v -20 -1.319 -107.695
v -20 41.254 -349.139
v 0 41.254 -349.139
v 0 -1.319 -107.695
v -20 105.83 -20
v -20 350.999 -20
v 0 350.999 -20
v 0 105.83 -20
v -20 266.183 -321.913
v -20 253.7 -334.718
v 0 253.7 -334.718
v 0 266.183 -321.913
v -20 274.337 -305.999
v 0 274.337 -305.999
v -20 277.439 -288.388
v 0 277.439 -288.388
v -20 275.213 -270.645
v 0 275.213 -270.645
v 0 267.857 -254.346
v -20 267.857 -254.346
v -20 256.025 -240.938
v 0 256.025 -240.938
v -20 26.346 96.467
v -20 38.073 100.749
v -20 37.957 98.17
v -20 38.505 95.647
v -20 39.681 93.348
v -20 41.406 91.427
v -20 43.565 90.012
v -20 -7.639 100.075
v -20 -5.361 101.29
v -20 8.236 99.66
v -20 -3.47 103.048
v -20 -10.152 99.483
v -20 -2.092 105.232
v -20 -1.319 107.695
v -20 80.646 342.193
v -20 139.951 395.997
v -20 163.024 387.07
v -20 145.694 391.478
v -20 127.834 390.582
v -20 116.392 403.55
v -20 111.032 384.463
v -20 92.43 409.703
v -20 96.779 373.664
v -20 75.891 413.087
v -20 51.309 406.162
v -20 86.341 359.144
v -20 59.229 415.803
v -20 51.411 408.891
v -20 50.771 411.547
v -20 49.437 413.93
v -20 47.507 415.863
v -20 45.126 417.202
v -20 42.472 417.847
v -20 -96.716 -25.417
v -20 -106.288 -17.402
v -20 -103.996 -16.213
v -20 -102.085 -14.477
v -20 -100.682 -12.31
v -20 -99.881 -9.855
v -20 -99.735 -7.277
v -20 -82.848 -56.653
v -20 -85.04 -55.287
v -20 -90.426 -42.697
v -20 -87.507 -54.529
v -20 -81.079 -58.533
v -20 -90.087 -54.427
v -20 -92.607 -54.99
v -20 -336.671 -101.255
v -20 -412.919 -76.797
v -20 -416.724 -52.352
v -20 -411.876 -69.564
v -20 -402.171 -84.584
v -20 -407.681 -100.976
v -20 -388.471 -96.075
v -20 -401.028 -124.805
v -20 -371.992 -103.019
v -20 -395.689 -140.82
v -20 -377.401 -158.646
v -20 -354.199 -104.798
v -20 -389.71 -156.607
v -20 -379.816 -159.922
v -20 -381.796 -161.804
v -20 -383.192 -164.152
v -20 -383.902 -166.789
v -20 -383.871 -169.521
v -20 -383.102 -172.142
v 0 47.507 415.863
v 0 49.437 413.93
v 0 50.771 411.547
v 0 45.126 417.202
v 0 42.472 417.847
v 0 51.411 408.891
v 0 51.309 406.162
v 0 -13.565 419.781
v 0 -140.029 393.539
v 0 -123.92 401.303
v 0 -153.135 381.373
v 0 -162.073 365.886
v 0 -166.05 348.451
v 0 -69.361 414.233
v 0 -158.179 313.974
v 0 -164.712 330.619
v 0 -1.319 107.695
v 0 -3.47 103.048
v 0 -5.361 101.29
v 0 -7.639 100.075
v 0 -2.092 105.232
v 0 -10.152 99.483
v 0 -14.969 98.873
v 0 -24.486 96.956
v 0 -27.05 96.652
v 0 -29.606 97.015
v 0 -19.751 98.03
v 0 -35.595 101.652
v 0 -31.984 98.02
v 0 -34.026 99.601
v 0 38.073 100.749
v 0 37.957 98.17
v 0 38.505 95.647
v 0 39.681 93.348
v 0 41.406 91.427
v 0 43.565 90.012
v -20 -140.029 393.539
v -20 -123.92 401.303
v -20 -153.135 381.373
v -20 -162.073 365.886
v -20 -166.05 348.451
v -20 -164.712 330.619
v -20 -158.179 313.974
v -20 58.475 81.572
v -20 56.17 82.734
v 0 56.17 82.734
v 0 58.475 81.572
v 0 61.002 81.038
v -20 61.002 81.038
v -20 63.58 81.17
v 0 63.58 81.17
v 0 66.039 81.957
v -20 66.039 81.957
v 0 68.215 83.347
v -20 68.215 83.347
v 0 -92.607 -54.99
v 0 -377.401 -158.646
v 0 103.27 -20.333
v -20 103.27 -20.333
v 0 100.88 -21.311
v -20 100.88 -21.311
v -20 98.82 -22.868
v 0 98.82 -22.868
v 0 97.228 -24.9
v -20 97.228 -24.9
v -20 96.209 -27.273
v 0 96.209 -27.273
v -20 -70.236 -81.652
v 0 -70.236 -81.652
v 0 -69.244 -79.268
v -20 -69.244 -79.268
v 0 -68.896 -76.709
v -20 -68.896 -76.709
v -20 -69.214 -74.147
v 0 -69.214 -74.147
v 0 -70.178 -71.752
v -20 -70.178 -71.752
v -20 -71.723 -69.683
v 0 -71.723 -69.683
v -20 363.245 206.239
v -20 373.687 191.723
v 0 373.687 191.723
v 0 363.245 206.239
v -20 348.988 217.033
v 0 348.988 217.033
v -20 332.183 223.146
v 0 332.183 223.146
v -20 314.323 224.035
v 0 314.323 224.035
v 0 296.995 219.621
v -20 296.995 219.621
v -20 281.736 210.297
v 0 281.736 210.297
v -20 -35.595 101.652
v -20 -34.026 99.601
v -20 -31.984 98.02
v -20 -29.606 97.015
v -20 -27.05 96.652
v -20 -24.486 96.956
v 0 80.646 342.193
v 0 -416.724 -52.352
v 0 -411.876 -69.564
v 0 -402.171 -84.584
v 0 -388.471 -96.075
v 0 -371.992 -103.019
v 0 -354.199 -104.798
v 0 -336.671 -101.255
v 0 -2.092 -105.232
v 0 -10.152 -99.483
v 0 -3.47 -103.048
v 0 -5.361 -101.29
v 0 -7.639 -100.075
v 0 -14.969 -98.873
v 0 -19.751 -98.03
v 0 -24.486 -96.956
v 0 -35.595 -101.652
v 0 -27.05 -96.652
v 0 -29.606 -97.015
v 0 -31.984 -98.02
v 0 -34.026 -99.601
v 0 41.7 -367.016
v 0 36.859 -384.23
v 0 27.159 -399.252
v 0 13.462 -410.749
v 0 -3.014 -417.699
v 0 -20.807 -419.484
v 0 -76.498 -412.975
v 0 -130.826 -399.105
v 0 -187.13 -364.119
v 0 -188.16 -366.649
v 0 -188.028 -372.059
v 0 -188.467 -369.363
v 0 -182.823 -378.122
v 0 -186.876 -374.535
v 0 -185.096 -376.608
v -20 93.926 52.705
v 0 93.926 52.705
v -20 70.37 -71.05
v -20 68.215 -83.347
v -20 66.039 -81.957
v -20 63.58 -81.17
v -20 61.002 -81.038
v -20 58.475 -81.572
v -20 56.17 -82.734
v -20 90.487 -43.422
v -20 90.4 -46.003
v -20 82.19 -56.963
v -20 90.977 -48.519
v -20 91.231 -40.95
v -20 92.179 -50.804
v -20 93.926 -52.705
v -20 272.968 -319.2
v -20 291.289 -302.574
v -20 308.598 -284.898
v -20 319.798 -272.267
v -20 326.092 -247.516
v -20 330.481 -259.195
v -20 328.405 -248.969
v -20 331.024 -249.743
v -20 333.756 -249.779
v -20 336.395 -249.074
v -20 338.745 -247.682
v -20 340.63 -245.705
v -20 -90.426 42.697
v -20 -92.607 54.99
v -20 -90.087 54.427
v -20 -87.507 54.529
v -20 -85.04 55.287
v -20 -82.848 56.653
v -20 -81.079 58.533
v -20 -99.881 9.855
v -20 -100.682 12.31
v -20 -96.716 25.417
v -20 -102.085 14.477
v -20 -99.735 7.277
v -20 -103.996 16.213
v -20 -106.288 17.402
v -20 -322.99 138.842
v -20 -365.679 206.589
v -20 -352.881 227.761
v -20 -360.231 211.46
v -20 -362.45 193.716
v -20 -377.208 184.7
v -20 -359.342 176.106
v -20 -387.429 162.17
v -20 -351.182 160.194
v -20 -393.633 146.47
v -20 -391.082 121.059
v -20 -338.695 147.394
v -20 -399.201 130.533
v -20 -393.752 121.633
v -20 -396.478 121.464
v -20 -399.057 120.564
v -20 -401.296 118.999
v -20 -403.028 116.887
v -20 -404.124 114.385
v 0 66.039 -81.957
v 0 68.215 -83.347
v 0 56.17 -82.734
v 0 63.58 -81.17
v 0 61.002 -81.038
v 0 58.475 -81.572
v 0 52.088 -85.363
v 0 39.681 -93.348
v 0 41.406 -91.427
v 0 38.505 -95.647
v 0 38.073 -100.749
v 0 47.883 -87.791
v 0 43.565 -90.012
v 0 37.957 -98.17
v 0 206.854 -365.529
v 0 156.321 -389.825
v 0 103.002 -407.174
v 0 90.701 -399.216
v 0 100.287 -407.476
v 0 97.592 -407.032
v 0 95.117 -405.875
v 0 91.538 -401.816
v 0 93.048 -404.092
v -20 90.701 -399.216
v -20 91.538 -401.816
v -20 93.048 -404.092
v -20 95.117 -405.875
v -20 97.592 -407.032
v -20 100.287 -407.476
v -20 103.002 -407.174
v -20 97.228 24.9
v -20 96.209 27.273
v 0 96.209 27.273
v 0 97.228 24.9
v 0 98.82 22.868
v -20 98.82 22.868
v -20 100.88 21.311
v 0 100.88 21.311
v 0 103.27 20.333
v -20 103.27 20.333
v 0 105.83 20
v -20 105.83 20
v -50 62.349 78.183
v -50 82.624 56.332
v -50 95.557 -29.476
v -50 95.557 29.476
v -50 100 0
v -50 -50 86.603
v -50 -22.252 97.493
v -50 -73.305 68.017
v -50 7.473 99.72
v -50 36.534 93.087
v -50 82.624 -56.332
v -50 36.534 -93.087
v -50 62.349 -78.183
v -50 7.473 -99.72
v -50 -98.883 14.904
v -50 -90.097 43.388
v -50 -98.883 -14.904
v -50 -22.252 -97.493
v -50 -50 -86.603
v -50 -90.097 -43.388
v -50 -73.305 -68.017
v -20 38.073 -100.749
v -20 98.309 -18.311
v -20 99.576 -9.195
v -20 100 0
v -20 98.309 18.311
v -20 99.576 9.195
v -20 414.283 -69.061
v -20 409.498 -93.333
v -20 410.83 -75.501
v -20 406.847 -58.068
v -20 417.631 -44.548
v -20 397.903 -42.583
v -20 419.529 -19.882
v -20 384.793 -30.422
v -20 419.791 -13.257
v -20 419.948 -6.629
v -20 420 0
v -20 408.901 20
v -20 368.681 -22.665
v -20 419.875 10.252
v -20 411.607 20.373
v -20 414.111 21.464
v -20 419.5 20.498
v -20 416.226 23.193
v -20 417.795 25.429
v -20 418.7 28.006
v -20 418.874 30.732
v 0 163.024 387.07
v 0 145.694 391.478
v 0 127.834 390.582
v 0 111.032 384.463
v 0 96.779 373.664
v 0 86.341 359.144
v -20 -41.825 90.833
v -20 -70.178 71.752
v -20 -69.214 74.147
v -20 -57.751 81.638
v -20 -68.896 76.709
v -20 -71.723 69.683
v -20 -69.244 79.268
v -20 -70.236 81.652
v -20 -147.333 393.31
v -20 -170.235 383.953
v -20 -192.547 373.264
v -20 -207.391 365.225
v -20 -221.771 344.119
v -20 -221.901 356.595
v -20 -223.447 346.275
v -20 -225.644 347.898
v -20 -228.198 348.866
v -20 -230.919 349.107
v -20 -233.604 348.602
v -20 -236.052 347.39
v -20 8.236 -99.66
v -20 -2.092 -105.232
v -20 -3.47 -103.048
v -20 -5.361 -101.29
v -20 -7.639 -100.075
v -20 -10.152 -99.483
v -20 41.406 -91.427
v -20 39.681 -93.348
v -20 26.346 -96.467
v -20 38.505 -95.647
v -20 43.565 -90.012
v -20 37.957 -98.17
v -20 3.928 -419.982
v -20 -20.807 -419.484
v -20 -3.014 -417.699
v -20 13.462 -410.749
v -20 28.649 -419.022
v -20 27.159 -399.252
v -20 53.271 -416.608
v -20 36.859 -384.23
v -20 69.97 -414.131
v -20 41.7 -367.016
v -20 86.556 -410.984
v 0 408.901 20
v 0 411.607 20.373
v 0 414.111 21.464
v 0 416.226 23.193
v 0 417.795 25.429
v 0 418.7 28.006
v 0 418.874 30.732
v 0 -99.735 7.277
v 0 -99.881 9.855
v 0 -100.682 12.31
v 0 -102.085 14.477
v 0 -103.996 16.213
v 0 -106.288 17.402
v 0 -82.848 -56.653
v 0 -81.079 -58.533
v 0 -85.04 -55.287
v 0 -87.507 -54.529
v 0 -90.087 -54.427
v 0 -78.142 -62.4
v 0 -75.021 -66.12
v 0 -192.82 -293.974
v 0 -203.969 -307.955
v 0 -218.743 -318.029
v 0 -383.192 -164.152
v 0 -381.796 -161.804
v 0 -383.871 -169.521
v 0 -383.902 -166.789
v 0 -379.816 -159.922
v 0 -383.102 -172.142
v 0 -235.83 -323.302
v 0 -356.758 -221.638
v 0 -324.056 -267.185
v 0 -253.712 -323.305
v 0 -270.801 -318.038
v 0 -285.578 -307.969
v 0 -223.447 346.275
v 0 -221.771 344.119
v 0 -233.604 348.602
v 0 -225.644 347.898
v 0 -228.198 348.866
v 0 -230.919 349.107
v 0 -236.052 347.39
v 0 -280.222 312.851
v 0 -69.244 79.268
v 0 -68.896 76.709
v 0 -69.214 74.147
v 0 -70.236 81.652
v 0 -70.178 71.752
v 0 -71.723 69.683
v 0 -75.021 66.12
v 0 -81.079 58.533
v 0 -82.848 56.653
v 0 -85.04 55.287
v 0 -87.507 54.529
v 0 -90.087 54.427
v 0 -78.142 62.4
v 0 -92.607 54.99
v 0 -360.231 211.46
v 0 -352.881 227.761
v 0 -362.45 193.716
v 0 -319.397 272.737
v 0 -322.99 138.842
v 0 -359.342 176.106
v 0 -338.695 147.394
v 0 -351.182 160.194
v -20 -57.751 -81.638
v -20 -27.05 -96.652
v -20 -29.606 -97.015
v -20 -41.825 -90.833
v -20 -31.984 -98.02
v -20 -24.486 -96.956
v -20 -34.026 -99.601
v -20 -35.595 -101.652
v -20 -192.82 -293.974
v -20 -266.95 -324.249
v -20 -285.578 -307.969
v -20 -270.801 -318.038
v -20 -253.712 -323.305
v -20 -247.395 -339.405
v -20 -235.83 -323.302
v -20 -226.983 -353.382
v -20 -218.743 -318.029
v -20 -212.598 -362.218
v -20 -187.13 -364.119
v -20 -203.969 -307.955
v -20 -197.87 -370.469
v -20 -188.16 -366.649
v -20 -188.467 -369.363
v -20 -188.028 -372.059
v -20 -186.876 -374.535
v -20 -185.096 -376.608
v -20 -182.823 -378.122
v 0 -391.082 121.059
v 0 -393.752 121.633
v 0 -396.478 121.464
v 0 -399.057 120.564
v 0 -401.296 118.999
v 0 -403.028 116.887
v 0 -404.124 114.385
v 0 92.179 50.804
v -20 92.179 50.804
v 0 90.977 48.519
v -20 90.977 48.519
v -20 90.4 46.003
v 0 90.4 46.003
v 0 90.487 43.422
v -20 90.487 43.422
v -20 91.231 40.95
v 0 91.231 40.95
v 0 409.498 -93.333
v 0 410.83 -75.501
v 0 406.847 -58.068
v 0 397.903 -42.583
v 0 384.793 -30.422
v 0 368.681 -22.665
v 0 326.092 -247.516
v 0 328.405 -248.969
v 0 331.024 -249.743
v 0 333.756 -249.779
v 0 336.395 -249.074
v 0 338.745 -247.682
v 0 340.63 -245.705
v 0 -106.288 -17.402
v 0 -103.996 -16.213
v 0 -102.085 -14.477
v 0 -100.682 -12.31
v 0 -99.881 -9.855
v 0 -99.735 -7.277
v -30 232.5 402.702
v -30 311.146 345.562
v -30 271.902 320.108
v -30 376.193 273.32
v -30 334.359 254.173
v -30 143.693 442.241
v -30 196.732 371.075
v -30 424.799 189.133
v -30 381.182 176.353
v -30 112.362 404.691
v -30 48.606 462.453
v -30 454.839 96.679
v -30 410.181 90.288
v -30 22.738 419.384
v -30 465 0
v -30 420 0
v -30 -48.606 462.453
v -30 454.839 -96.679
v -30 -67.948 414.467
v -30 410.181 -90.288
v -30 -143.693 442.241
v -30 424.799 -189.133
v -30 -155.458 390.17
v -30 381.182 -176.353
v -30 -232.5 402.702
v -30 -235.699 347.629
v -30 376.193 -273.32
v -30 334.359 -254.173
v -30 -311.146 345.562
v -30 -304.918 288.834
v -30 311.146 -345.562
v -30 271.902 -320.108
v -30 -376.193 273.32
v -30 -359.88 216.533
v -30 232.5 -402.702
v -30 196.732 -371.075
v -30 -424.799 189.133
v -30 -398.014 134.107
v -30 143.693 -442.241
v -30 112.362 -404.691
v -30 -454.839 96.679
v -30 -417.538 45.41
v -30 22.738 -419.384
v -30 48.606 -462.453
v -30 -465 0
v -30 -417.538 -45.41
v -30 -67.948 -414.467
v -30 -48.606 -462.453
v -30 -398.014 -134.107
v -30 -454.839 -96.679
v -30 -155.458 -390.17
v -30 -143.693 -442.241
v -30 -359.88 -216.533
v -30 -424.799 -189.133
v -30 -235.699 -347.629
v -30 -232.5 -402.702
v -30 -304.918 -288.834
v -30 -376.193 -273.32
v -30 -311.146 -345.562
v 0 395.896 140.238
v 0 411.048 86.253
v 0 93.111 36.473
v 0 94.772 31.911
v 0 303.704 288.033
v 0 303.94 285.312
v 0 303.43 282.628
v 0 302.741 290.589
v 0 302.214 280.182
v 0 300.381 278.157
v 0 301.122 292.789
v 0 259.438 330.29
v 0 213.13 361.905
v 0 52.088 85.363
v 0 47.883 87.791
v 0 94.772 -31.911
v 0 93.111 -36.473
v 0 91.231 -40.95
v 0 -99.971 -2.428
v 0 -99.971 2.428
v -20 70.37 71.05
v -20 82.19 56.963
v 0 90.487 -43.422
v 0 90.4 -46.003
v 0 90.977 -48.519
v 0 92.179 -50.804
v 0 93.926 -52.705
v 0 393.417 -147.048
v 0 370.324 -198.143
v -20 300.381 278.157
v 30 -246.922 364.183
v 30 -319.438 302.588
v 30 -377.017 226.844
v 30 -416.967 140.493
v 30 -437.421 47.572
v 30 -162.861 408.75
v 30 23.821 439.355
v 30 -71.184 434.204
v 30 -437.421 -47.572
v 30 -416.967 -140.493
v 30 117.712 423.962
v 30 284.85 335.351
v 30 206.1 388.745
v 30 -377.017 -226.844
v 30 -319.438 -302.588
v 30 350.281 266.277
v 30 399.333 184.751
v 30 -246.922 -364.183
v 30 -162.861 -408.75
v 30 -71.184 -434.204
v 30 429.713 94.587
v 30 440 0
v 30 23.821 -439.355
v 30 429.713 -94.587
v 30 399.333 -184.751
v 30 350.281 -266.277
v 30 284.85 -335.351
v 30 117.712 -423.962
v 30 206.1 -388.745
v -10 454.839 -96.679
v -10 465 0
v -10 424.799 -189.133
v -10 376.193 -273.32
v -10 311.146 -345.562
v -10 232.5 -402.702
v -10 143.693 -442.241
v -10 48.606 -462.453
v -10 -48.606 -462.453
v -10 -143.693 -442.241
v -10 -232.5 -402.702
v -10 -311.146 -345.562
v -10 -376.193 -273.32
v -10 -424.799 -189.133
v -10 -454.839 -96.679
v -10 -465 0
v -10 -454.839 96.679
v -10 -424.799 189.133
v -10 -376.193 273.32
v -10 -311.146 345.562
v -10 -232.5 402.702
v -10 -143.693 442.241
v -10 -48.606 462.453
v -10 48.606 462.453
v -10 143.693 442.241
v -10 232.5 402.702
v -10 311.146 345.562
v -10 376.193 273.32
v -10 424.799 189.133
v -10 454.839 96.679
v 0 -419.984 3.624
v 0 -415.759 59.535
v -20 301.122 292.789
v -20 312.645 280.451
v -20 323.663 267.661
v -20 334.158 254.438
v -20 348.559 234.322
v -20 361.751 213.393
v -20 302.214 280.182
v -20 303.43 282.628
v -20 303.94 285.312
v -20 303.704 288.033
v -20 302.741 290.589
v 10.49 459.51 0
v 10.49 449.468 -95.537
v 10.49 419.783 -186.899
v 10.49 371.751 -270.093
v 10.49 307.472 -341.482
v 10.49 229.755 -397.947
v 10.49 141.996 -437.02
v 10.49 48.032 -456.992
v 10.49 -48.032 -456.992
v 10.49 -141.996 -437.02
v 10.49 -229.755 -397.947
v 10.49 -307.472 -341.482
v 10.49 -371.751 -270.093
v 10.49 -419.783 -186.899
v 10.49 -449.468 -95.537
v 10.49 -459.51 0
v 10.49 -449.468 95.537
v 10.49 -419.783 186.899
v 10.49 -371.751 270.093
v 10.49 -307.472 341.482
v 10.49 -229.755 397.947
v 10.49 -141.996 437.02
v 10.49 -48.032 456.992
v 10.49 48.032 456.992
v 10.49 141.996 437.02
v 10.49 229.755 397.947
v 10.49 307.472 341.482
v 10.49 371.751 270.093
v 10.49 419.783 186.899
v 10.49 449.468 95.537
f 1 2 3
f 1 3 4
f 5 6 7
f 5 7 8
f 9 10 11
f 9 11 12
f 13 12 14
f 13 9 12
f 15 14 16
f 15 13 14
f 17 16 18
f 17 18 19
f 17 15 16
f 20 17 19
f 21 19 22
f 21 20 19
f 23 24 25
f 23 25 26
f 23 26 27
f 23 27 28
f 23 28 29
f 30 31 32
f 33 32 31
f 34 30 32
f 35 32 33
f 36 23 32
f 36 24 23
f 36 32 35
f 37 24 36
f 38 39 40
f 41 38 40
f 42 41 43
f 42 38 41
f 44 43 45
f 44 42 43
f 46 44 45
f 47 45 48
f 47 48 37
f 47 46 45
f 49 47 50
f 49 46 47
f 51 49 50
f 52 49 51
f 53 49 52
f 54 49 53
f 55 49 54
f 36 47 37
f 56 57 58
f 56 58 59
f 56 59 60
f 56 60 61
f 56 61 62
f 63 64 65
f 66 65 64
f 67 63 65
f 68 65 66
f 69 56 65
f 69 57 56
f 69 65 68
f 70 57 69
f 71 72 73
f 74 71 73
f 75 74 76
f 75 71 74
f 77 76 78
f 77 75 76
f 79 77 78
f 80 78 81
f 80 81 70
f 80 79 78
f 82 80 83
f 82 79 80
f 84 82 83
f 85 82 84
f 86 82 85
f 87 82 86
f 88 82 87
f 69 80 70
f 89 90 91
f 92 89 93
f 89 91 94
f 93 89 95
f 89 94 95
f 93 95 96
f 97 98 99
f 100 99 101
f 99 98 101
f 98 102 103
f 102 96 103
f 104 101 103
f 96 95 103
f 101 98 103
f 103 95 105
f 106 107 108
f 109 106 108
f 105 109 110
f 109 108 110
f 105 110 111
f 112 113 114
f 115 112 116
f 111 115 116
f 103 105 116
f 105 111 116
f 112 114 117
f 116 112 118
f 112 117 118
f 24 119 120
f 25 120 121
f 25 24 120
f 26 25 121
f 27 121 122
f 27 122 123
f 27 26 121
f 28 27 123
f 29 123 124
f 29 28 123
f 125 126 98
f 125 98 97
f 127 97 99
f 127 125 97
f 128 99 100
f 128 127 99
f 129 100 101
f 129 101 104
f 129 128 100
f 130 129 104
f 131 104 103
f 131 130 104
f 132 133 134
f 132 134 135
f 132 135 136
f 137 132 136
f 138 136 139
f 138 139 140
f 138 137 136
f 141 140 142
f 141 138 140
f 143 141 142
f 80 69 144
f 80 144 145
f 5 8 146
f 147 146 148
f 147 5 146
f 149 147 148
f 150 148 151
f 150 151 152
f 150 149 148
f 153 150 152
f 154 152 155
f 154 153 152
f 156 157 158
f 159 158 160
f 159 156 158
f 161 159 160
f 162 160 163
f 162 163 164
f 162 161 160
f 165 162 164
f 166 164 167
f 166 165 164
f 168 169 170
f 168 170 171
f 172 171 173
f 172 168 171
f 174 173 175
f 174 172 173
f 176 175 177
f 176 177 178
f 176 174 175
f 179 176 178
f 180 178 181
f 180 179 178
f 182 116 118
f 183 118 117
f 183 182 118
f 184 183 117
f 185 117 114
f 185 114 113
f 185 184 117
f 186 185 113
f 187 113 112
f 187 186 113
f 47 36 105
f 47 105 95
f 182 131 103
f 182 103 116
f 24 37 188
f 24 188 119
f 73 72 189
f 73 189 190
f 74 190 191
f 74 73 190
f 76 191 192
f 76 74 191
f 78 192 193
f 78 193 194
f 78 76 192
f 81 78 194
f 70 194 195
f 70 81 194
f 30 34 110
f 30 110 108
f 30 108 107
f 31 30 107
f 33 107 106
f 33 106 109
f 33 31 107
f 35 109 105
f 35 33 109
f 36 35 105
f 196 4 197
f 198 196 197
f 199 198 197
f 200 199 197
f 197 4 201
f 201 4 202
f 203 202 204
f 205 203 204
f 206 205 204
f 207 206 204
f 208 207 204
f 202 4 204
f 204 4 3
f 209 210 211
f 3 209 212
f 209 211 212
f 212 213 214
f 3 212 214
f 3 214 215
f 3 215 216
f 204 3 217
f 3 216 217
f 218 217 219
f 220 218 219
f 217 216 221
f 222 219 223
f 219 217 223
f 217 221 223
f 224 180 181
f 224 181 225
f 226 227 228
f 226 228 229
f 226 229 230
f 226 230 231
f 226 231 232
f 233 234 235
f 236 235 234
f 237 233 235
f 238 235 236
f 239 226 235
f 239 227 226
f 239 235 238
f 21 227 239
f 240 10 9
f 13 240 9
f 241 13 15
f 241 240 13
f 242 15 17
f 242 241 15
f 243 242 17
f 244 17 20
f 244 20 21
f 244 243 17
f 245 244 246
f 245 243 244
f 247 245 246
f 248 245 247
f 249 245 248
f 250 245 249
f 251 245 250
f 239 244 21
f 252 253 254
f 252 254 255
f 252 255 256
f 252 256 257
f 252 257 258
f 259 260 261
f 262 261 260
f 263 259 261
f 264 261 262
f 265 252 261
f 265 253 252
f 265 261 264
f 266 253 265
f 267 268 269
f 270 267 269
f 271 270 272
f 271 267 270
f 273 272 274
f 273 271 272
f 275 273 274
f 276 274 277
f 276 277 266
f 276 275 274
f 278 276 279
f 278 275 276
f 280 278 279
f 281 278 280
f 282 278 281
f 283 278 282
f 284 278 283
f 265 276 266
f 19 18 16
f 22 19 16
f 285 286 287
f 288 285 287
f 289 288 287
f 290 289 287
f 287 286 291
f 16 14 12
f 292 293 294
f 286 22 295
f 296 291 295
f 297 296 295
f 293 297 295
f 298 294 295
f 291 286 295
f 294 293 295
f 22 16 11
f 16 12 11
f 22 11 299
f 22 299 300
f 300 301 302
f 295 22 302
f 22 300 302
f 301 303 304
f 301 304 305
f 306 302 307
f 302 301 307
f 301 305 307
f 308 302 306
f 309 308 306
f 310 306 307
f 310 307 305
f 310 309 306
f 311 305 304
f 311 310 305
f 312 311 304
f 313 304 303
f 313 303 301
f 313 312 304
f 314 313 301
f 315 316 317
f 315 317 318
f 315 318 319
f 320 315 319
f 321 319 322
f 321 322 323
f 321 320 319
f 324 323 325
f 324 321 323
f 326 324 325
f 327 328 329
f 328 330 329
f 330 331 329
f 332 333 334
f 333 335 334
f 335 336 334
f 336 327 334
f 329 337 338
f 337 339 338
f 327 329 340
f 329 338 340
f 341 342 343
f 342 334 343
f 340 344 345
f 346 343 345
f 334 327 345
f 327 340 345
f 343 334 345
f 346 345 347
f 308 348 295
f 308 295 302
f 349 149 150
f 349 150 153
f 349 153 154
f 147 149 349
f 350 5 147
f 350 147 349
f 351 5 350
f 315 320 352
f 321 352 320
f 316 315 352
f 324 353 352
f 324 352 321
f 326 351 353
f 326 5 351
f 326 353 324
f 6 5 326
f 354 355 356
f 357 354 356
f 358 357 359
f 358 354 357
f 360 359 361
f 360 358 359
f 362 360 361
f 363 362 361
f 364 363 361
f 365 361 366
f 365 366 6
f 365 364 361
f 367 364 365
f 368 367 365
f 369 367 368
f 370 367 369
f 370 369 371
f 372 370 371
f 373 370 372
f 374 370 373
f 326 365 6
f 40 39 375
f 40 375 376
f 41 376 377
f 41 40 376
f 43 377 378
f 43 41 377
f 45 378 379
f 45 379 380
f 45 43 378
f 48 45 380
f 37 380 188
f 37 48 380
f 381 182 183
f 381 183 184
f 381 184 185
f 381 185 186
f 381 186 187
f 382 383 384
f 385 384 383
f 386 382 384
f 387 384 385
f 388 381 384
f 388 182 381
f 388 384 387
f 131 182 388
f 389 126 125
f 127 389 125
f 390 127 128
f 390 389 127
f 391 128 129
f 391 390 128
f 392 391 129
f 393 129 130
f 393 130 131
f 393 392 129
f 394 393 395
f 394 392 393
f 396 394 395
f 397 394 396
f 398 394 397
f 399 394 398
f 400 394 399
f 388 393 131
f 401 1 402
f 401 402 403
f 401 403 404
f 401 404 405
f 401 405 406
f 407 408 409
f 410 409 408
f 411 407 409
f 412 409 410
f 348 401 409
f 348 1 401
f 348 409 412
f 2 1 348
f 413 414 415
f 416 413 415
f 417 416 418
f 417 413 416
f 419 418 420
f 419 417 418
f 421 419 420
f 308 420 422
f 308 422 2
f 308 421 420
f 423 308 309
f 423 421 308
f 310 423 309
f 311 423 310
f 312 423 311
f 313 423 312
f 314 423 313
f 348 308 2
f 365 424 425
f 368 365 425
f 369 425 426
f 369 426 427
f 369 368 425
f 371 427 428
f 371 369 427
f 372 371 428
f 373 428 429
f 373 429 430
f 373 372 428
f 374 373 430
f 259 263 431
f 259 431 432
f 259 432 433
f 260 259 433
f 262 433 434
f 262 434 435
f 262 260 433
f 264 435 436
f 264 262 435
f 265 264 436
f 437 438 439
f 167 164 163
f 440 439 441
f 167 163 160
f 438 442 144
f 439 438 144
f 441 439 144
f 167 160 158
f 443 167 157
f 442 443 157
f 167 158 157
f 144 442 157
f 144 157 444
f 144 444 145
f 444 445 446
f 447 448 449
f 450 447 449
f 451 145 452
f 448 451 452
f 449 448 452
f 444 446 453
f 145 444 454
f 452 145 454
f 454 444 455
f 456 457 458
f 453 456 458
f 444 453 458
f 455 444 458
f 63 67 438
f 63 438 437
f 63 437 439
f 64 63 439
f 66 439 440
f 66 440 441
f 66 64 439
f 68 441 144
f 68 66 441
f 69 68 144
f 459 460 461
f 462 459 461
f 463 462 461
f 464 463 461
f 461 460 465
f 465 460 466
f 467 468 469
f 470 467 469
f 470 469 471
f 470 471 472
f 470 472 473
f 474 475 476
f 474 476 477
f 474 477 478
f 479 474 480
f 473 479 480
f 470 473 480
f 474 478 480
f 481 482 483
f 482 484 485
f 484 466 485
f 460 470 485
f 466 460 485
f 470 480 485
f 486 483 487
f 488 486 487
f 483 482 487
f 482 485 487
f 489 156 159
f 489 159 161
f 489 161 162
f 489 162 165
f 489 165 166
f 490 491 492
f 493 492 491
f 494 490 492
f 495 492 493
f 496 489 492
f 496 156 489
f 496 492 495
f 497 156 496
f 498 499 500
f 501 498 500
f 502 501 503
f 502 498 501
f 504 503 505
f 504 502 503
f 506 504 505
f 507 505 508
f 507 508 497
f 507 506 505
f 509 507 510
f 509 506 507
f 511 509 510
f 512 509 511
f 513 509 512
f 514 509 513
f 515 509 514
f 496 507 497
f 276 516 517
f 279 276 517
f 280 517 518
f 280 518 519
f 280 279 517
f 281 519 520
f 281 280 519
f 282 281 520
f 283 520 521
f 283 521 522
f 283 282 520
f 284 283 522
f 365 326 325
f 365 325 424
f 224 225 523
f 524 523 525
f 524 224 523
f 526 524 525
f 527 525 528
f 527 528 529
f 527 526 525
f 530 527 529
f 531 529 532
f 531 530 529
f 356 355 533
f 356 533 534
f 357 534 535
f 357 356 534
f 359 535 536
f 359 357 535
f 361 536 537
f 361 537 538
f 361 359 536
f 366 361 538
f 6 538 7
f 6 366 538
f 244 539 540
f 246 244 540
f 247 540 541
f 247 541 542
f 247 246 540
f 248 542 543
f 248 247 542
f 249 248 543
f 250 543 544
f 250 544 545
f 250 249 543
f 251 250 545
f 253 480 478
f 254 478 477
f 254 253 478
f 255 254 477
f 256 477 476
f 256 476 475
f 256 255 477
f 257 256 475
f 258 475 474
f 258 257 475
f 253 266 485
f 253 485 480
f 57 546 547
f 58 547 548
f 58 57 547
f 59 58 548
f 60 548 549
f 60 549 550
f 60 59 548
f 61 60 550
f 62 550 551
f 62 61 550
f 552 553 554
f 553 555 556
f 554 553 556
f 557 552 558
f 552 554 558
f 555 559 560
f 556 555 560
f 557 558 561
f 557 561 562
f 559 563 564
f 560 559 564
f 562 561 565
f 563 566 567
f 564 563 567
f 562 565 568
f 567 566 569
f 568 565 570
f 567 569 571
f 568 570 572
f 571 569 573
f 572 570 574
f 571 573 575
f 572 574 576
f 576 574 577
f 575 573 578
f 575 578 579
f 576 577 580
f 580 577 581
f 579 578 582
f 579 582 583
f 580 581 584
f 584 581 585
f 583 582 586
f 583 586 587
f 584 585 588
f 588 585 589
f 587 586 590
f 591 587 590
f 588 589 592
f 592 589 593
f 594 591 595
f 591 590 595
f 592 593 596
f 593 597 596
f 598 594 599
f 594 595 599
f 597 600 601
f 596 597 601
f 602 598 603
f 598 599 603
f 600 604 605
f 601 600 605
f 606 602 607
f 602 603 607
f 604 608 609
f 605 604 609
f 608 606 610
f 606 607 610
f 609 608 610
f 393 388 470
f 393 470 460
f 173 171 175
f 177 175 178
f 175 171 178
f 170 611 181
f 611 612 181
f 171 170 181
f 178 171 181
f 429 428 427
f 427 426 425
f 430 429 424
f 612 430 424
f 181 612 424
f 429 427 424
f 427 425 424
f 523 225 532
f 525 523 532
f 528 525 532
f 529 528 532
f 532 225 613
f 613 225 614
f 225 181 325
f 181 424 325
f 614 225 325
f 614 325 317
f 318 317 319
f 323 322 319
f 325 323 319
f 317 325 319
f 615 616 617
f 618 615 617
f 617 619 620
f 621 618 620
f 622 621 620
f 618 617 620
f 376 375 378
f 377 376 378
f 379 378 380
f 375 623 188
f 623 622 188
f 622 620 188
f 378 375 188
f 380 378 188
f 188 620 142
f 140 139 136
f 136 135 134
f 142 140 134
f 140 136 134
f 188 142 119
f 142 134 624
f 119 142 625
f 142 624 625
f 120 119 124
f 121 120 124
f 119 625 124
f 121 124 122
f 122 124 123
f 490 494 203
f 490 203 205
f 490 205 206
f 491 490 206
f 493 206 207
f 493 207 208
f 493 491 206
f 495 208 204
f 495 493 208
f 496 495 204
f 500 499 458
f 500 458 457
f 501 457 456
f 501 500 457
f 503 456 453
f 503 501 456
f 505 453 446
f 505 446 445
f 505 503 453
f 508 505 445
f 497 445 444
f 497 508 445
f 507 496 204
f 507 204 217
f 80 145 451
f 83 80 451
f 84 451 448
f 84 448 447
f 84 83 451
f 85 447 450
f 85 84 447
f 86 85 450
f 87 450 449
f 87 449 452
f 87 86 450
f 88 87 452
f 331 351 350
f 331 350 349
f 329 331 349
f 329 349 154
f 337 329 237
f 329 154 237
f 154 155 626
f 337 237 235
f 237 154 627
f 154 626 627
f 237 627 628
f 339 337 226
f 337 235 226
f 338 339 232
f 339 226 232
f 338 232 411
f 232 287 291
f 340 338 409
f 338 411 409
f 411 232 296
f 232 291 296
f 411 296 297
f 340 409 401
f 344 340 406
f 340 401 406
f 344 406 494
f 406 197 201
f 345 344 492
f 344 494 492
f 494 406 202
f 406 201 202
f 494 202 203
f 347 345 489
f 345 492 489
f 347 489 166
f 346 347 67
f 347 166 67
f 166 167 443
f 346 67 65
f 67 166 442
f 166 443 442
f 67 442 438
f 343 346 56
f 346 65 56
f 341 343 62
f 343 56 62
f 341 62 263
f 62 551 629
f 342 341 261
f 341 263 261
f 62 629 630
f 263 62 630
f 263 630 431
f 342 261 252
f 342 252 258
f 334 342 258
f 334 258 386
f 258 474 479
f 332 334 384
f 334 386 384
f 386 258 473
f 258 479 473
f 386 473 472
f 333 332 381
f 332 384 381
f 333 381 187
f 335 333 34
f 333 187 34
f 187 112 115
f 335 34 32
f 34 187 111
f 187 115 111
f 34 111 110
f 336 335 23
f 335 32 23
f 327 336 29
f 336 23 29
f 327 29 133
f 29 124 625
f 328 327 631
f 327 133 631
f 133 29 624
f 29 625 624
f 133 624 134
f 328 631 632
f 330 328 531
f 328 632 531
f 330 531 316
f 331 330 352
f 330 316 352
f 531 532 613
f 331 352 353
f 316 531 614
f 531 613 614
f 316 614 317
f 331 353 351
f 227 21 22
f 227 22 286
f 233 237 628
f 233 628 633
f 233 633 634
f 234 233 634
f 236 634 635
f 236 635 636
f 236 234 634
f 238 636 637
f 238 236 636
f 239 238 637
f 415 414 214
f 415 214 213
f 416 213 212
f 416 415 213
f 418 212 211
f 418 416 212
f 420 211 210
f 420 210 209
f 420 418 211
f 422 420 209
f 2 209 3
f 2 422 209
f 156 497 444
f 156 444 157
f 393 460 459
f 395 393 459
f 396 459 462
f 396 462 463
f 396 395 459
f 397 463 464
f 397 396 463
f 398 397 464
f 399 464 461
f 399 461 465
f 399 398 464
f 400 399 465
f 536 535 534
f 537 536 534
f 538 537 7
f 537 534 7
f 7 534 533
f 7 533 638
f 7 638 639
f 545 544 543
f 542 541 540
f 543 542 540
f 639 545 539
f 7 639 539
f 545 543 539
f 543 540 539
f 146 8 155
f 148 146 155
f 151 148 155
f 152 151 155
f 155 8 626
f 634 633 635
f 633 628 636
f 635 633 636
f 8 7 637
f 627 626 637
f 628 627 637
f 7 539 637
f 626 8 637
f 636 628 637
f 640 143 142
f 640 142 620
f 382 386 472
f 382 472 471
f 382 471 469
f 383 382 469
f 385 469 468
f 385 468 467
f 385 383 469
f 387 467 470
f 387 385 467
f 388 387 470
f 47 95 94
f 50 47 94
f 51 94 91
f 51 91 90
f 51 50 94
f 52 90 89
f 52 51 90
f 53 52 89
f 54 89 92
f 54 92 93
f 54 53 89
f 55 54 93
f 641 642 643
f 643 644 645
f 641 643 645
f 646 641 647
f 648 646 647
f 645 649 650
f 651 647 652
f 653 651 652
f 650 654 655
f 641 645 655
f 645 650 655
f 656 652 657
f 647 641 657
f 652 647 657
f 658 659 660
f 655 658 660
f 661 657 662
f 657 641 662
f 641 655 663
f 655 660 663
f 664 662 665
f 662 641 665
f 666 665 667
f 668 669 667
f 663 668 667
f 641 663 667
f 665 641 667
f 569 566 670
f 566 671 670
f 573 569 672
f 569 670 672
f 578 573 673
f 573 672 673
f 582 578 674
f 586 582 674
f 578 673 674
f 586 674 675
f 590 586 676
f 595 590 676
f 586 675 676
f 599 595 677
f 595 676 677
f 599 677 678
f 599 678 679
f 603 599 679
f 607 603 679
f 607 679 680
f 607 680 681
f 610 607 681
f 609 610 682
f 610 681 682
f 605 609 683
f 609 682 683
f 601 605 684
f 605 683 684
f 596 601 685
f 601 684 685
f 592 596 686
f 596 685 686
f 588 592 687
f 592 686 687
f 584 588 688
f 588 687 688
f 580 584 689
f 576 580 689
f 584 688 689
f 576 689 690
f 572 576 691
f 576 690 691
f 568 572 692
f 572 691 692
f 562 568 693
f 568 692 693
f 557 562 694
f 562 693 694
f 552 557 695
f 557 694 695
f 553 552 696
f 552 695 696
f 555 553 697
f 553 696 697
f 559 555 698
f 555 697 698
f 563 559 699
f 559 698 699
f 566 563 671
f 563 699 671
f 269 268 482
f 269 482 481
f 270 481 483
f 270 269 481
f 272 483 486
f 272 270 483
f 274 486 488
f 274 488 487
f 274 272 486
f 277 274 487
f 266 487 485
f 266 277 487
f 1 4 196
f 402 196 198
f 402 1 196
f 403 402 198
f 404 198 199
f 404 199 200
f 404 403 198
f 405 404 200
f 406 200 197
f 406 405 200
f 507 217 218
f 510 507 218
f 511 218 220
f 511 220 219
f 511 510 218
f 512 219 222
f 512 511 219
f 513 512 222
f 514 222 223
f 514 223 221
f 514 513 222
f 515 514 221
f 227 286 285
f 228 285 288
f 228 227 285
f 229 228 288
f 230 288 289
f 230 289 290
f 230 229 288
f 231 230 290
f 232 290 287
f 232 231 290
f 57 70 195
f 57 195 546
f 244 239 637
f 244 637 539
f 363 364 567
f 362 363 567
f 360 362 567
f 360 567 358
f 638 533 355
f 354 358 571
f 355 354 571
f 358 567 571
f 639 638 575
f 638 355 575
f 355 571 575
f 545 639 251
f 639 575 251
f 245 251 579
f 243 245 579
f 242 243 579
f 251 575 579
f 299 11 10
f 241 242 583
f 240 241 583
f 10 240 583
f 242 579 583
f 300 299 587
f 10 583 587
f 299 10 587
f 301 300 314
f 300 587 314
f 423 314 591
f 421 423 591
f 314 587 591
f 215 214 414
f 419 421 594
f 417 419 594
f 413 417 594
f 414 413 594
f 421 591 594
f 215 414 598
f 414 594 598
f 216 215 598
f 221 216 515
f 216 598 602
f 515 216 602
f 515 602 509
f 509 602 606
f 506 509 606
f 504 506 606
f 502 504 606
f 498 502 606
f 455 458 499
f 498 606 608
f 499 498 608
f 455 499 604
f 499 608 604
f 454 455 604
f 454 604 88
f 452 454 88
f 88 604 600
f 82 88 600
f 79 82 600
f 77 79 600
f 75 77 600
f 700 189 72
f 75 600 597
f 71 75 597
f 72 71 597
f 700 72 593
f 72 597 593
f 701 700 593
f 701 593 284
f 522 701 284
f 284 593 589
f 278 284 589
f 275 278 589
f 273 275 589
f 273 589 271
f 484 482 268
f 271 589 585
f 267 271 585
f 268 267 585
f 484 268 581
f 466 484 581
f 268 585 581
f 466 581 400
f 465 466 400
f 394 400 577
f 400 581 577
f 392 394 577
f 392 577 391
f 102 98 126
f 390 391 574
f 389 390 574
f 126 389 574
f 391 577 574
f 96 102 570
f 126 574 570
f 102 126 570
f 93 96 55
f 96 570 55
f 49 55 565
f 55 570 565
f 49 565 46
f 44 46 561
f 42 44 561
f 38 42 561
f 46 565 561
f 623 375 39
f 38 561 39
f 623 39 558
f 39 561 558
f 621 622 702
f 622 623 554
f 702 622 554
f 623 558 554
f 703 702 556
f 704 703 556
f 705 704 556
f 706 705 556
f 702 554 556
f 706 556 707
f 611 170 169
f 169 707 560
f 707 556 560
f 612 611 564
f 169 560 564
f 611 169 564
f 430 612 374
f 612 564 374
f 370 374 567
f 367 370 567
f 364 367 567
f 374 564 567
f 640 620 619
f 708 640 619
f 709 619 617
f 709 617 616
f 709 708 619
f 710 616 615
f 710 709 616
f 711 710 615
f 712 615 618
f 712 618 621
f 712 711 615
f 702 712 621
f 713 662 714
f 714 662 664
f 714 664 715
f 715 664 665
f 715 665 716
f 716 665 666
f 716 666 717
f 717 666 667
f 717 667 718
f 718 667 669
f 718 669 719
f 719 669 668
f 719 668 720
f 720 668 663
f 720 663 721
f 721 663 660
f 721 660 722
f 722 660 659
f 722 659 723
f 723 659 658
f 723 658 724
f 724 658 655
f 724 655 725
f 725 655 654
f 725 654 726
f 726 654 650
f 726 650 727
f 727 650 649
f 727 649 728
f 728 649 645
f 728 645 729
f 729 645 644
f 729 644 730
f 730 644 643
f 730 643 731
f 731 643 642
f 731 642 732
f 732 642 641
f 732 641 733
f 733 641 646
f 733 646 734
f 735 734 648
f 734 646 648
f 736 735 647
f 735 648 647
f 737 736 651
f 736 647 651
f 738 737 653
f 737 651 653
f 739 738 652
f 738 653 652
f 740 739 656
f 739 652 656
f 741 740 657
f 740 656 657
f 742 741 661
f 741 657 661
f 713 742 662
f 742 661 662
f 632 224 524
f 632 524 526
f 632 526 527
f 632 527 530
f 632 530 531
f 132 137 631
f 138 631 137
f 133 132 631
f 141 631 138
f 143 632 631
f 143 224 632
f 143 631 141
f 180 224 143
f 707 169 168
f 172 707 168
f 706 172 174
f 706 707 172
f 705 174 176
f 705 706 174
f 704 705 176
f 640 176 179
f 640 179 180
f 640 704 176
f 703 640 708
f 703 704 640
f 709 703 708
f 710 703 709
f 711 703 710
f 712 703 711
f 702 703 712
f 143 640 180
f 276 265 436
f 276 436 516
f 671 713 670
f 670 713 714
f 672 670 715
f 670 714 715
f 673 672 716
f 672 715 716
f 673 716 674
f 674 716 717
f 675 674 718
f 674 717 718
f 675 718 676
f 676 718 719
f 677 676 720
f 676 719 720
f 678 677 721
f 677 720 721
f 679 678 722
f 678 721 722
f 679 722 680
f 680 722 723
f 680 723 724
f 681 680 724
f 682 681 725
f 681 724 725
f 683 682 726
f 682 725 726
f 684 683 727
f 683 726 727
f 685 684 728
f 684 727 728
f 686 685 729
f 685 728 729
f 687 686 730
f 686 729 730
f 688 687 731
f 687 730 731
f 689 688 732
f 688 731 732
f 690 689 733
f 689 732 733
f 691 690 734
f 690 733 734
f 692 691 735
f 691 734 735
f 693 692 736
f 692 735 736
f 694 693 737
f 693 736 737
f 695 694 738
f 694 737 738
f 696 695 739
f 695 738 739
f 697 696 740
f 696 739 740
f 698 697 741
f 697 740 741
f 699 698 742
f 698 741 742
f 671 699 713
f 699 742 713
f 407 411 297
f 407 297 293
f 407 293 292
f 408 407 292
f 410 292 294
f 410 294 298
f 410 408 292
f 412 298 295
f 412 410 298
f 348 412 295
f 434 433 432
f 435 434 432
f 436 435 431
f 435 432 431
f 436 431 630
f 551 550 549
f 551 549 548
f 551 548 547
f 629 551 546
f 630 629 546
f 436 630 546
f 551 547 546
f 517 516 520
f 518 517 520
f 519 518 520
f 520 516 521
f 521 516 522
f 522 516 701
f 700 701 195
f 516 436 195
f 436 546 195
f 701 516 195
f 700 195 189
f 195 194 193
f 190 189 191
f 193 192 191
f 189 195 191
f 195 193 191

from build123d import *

# Parameters (mm, degrees)
BOSS_EXTRUDE1_START = 20
BOSS_EXTRUDE1_DEPTH = 20
CIRPATTERN1_COUNT   = 9


with BuildPart() as part:
    # Sketch1 → Revolve1 (revolve)
    with BuildSketch(Plane.XY):
        Polygon((-50, 0), (-50, 100), (0, 100), (0, 420), (-30, 420), (-30, 465), (-10, 465), (10.490381057, 459.509618943), (30, 440), (30, 0), align=None)
    revolve(axis=Axis((30, 0, 0), (-1, 0, 0)))

    # Sketch2 → Boss-Extrude1 (add)
    with BuildSketch(Plane.ZY.offset(BOSS_EXTRUDE1_START)):
        with BuildLine():
            ThreePointArc((27.272727273, 96.209138584), (22.022759648, 99.799825551), (20, 105.830052443))
            Line((20, 105.830052443), (20, 408.900966005))
            ThreePointArc((20, 408.900966005), (23.192543543, 416.226164746), (30.731707317, 418.874160298))
            ThreePointArc((30.731707317, 418.874160298), (5.43490171, 419.964834056), (-19.881656805, 419.529164329))
            ThreePointArc((-19.881656805, 419.529164329), (-56.82924306, 416.1375219), (-93.333333333, 409.498338078))
            ThreePointArc((-93.333333333, 409.498338078), (-42.583426132, 397.902733094), (-20, 350.998575496))
            Line((-20, 350.998575496), (-20, 105.830052443))
            ThreePointArc((-20, 105.830052443), (-22.022759648, 99.799825551), (-27.272727273, 96.209138584))
            ThreePointArc((-27.272727273, 96.209138584), (0, 100), (27.272727273, 96.209138584))
        make_face()
    boss_extrude1 = extrude(amount=-BOSS_EXTRUDE1_DEPTH)

    # CirPattern1: Boss-Extrude1 ×9 about axis
    cirpattern1_axis = Axis((0, 0, 0), (1, 0, 0))
    for i in range(1, CIRPATTERN1_COUNT):
        add(boss_extrude1.rotate(cirpattern1_axis, i * 360 / CIRPATTERN1_COUNT))


solid = part.part
